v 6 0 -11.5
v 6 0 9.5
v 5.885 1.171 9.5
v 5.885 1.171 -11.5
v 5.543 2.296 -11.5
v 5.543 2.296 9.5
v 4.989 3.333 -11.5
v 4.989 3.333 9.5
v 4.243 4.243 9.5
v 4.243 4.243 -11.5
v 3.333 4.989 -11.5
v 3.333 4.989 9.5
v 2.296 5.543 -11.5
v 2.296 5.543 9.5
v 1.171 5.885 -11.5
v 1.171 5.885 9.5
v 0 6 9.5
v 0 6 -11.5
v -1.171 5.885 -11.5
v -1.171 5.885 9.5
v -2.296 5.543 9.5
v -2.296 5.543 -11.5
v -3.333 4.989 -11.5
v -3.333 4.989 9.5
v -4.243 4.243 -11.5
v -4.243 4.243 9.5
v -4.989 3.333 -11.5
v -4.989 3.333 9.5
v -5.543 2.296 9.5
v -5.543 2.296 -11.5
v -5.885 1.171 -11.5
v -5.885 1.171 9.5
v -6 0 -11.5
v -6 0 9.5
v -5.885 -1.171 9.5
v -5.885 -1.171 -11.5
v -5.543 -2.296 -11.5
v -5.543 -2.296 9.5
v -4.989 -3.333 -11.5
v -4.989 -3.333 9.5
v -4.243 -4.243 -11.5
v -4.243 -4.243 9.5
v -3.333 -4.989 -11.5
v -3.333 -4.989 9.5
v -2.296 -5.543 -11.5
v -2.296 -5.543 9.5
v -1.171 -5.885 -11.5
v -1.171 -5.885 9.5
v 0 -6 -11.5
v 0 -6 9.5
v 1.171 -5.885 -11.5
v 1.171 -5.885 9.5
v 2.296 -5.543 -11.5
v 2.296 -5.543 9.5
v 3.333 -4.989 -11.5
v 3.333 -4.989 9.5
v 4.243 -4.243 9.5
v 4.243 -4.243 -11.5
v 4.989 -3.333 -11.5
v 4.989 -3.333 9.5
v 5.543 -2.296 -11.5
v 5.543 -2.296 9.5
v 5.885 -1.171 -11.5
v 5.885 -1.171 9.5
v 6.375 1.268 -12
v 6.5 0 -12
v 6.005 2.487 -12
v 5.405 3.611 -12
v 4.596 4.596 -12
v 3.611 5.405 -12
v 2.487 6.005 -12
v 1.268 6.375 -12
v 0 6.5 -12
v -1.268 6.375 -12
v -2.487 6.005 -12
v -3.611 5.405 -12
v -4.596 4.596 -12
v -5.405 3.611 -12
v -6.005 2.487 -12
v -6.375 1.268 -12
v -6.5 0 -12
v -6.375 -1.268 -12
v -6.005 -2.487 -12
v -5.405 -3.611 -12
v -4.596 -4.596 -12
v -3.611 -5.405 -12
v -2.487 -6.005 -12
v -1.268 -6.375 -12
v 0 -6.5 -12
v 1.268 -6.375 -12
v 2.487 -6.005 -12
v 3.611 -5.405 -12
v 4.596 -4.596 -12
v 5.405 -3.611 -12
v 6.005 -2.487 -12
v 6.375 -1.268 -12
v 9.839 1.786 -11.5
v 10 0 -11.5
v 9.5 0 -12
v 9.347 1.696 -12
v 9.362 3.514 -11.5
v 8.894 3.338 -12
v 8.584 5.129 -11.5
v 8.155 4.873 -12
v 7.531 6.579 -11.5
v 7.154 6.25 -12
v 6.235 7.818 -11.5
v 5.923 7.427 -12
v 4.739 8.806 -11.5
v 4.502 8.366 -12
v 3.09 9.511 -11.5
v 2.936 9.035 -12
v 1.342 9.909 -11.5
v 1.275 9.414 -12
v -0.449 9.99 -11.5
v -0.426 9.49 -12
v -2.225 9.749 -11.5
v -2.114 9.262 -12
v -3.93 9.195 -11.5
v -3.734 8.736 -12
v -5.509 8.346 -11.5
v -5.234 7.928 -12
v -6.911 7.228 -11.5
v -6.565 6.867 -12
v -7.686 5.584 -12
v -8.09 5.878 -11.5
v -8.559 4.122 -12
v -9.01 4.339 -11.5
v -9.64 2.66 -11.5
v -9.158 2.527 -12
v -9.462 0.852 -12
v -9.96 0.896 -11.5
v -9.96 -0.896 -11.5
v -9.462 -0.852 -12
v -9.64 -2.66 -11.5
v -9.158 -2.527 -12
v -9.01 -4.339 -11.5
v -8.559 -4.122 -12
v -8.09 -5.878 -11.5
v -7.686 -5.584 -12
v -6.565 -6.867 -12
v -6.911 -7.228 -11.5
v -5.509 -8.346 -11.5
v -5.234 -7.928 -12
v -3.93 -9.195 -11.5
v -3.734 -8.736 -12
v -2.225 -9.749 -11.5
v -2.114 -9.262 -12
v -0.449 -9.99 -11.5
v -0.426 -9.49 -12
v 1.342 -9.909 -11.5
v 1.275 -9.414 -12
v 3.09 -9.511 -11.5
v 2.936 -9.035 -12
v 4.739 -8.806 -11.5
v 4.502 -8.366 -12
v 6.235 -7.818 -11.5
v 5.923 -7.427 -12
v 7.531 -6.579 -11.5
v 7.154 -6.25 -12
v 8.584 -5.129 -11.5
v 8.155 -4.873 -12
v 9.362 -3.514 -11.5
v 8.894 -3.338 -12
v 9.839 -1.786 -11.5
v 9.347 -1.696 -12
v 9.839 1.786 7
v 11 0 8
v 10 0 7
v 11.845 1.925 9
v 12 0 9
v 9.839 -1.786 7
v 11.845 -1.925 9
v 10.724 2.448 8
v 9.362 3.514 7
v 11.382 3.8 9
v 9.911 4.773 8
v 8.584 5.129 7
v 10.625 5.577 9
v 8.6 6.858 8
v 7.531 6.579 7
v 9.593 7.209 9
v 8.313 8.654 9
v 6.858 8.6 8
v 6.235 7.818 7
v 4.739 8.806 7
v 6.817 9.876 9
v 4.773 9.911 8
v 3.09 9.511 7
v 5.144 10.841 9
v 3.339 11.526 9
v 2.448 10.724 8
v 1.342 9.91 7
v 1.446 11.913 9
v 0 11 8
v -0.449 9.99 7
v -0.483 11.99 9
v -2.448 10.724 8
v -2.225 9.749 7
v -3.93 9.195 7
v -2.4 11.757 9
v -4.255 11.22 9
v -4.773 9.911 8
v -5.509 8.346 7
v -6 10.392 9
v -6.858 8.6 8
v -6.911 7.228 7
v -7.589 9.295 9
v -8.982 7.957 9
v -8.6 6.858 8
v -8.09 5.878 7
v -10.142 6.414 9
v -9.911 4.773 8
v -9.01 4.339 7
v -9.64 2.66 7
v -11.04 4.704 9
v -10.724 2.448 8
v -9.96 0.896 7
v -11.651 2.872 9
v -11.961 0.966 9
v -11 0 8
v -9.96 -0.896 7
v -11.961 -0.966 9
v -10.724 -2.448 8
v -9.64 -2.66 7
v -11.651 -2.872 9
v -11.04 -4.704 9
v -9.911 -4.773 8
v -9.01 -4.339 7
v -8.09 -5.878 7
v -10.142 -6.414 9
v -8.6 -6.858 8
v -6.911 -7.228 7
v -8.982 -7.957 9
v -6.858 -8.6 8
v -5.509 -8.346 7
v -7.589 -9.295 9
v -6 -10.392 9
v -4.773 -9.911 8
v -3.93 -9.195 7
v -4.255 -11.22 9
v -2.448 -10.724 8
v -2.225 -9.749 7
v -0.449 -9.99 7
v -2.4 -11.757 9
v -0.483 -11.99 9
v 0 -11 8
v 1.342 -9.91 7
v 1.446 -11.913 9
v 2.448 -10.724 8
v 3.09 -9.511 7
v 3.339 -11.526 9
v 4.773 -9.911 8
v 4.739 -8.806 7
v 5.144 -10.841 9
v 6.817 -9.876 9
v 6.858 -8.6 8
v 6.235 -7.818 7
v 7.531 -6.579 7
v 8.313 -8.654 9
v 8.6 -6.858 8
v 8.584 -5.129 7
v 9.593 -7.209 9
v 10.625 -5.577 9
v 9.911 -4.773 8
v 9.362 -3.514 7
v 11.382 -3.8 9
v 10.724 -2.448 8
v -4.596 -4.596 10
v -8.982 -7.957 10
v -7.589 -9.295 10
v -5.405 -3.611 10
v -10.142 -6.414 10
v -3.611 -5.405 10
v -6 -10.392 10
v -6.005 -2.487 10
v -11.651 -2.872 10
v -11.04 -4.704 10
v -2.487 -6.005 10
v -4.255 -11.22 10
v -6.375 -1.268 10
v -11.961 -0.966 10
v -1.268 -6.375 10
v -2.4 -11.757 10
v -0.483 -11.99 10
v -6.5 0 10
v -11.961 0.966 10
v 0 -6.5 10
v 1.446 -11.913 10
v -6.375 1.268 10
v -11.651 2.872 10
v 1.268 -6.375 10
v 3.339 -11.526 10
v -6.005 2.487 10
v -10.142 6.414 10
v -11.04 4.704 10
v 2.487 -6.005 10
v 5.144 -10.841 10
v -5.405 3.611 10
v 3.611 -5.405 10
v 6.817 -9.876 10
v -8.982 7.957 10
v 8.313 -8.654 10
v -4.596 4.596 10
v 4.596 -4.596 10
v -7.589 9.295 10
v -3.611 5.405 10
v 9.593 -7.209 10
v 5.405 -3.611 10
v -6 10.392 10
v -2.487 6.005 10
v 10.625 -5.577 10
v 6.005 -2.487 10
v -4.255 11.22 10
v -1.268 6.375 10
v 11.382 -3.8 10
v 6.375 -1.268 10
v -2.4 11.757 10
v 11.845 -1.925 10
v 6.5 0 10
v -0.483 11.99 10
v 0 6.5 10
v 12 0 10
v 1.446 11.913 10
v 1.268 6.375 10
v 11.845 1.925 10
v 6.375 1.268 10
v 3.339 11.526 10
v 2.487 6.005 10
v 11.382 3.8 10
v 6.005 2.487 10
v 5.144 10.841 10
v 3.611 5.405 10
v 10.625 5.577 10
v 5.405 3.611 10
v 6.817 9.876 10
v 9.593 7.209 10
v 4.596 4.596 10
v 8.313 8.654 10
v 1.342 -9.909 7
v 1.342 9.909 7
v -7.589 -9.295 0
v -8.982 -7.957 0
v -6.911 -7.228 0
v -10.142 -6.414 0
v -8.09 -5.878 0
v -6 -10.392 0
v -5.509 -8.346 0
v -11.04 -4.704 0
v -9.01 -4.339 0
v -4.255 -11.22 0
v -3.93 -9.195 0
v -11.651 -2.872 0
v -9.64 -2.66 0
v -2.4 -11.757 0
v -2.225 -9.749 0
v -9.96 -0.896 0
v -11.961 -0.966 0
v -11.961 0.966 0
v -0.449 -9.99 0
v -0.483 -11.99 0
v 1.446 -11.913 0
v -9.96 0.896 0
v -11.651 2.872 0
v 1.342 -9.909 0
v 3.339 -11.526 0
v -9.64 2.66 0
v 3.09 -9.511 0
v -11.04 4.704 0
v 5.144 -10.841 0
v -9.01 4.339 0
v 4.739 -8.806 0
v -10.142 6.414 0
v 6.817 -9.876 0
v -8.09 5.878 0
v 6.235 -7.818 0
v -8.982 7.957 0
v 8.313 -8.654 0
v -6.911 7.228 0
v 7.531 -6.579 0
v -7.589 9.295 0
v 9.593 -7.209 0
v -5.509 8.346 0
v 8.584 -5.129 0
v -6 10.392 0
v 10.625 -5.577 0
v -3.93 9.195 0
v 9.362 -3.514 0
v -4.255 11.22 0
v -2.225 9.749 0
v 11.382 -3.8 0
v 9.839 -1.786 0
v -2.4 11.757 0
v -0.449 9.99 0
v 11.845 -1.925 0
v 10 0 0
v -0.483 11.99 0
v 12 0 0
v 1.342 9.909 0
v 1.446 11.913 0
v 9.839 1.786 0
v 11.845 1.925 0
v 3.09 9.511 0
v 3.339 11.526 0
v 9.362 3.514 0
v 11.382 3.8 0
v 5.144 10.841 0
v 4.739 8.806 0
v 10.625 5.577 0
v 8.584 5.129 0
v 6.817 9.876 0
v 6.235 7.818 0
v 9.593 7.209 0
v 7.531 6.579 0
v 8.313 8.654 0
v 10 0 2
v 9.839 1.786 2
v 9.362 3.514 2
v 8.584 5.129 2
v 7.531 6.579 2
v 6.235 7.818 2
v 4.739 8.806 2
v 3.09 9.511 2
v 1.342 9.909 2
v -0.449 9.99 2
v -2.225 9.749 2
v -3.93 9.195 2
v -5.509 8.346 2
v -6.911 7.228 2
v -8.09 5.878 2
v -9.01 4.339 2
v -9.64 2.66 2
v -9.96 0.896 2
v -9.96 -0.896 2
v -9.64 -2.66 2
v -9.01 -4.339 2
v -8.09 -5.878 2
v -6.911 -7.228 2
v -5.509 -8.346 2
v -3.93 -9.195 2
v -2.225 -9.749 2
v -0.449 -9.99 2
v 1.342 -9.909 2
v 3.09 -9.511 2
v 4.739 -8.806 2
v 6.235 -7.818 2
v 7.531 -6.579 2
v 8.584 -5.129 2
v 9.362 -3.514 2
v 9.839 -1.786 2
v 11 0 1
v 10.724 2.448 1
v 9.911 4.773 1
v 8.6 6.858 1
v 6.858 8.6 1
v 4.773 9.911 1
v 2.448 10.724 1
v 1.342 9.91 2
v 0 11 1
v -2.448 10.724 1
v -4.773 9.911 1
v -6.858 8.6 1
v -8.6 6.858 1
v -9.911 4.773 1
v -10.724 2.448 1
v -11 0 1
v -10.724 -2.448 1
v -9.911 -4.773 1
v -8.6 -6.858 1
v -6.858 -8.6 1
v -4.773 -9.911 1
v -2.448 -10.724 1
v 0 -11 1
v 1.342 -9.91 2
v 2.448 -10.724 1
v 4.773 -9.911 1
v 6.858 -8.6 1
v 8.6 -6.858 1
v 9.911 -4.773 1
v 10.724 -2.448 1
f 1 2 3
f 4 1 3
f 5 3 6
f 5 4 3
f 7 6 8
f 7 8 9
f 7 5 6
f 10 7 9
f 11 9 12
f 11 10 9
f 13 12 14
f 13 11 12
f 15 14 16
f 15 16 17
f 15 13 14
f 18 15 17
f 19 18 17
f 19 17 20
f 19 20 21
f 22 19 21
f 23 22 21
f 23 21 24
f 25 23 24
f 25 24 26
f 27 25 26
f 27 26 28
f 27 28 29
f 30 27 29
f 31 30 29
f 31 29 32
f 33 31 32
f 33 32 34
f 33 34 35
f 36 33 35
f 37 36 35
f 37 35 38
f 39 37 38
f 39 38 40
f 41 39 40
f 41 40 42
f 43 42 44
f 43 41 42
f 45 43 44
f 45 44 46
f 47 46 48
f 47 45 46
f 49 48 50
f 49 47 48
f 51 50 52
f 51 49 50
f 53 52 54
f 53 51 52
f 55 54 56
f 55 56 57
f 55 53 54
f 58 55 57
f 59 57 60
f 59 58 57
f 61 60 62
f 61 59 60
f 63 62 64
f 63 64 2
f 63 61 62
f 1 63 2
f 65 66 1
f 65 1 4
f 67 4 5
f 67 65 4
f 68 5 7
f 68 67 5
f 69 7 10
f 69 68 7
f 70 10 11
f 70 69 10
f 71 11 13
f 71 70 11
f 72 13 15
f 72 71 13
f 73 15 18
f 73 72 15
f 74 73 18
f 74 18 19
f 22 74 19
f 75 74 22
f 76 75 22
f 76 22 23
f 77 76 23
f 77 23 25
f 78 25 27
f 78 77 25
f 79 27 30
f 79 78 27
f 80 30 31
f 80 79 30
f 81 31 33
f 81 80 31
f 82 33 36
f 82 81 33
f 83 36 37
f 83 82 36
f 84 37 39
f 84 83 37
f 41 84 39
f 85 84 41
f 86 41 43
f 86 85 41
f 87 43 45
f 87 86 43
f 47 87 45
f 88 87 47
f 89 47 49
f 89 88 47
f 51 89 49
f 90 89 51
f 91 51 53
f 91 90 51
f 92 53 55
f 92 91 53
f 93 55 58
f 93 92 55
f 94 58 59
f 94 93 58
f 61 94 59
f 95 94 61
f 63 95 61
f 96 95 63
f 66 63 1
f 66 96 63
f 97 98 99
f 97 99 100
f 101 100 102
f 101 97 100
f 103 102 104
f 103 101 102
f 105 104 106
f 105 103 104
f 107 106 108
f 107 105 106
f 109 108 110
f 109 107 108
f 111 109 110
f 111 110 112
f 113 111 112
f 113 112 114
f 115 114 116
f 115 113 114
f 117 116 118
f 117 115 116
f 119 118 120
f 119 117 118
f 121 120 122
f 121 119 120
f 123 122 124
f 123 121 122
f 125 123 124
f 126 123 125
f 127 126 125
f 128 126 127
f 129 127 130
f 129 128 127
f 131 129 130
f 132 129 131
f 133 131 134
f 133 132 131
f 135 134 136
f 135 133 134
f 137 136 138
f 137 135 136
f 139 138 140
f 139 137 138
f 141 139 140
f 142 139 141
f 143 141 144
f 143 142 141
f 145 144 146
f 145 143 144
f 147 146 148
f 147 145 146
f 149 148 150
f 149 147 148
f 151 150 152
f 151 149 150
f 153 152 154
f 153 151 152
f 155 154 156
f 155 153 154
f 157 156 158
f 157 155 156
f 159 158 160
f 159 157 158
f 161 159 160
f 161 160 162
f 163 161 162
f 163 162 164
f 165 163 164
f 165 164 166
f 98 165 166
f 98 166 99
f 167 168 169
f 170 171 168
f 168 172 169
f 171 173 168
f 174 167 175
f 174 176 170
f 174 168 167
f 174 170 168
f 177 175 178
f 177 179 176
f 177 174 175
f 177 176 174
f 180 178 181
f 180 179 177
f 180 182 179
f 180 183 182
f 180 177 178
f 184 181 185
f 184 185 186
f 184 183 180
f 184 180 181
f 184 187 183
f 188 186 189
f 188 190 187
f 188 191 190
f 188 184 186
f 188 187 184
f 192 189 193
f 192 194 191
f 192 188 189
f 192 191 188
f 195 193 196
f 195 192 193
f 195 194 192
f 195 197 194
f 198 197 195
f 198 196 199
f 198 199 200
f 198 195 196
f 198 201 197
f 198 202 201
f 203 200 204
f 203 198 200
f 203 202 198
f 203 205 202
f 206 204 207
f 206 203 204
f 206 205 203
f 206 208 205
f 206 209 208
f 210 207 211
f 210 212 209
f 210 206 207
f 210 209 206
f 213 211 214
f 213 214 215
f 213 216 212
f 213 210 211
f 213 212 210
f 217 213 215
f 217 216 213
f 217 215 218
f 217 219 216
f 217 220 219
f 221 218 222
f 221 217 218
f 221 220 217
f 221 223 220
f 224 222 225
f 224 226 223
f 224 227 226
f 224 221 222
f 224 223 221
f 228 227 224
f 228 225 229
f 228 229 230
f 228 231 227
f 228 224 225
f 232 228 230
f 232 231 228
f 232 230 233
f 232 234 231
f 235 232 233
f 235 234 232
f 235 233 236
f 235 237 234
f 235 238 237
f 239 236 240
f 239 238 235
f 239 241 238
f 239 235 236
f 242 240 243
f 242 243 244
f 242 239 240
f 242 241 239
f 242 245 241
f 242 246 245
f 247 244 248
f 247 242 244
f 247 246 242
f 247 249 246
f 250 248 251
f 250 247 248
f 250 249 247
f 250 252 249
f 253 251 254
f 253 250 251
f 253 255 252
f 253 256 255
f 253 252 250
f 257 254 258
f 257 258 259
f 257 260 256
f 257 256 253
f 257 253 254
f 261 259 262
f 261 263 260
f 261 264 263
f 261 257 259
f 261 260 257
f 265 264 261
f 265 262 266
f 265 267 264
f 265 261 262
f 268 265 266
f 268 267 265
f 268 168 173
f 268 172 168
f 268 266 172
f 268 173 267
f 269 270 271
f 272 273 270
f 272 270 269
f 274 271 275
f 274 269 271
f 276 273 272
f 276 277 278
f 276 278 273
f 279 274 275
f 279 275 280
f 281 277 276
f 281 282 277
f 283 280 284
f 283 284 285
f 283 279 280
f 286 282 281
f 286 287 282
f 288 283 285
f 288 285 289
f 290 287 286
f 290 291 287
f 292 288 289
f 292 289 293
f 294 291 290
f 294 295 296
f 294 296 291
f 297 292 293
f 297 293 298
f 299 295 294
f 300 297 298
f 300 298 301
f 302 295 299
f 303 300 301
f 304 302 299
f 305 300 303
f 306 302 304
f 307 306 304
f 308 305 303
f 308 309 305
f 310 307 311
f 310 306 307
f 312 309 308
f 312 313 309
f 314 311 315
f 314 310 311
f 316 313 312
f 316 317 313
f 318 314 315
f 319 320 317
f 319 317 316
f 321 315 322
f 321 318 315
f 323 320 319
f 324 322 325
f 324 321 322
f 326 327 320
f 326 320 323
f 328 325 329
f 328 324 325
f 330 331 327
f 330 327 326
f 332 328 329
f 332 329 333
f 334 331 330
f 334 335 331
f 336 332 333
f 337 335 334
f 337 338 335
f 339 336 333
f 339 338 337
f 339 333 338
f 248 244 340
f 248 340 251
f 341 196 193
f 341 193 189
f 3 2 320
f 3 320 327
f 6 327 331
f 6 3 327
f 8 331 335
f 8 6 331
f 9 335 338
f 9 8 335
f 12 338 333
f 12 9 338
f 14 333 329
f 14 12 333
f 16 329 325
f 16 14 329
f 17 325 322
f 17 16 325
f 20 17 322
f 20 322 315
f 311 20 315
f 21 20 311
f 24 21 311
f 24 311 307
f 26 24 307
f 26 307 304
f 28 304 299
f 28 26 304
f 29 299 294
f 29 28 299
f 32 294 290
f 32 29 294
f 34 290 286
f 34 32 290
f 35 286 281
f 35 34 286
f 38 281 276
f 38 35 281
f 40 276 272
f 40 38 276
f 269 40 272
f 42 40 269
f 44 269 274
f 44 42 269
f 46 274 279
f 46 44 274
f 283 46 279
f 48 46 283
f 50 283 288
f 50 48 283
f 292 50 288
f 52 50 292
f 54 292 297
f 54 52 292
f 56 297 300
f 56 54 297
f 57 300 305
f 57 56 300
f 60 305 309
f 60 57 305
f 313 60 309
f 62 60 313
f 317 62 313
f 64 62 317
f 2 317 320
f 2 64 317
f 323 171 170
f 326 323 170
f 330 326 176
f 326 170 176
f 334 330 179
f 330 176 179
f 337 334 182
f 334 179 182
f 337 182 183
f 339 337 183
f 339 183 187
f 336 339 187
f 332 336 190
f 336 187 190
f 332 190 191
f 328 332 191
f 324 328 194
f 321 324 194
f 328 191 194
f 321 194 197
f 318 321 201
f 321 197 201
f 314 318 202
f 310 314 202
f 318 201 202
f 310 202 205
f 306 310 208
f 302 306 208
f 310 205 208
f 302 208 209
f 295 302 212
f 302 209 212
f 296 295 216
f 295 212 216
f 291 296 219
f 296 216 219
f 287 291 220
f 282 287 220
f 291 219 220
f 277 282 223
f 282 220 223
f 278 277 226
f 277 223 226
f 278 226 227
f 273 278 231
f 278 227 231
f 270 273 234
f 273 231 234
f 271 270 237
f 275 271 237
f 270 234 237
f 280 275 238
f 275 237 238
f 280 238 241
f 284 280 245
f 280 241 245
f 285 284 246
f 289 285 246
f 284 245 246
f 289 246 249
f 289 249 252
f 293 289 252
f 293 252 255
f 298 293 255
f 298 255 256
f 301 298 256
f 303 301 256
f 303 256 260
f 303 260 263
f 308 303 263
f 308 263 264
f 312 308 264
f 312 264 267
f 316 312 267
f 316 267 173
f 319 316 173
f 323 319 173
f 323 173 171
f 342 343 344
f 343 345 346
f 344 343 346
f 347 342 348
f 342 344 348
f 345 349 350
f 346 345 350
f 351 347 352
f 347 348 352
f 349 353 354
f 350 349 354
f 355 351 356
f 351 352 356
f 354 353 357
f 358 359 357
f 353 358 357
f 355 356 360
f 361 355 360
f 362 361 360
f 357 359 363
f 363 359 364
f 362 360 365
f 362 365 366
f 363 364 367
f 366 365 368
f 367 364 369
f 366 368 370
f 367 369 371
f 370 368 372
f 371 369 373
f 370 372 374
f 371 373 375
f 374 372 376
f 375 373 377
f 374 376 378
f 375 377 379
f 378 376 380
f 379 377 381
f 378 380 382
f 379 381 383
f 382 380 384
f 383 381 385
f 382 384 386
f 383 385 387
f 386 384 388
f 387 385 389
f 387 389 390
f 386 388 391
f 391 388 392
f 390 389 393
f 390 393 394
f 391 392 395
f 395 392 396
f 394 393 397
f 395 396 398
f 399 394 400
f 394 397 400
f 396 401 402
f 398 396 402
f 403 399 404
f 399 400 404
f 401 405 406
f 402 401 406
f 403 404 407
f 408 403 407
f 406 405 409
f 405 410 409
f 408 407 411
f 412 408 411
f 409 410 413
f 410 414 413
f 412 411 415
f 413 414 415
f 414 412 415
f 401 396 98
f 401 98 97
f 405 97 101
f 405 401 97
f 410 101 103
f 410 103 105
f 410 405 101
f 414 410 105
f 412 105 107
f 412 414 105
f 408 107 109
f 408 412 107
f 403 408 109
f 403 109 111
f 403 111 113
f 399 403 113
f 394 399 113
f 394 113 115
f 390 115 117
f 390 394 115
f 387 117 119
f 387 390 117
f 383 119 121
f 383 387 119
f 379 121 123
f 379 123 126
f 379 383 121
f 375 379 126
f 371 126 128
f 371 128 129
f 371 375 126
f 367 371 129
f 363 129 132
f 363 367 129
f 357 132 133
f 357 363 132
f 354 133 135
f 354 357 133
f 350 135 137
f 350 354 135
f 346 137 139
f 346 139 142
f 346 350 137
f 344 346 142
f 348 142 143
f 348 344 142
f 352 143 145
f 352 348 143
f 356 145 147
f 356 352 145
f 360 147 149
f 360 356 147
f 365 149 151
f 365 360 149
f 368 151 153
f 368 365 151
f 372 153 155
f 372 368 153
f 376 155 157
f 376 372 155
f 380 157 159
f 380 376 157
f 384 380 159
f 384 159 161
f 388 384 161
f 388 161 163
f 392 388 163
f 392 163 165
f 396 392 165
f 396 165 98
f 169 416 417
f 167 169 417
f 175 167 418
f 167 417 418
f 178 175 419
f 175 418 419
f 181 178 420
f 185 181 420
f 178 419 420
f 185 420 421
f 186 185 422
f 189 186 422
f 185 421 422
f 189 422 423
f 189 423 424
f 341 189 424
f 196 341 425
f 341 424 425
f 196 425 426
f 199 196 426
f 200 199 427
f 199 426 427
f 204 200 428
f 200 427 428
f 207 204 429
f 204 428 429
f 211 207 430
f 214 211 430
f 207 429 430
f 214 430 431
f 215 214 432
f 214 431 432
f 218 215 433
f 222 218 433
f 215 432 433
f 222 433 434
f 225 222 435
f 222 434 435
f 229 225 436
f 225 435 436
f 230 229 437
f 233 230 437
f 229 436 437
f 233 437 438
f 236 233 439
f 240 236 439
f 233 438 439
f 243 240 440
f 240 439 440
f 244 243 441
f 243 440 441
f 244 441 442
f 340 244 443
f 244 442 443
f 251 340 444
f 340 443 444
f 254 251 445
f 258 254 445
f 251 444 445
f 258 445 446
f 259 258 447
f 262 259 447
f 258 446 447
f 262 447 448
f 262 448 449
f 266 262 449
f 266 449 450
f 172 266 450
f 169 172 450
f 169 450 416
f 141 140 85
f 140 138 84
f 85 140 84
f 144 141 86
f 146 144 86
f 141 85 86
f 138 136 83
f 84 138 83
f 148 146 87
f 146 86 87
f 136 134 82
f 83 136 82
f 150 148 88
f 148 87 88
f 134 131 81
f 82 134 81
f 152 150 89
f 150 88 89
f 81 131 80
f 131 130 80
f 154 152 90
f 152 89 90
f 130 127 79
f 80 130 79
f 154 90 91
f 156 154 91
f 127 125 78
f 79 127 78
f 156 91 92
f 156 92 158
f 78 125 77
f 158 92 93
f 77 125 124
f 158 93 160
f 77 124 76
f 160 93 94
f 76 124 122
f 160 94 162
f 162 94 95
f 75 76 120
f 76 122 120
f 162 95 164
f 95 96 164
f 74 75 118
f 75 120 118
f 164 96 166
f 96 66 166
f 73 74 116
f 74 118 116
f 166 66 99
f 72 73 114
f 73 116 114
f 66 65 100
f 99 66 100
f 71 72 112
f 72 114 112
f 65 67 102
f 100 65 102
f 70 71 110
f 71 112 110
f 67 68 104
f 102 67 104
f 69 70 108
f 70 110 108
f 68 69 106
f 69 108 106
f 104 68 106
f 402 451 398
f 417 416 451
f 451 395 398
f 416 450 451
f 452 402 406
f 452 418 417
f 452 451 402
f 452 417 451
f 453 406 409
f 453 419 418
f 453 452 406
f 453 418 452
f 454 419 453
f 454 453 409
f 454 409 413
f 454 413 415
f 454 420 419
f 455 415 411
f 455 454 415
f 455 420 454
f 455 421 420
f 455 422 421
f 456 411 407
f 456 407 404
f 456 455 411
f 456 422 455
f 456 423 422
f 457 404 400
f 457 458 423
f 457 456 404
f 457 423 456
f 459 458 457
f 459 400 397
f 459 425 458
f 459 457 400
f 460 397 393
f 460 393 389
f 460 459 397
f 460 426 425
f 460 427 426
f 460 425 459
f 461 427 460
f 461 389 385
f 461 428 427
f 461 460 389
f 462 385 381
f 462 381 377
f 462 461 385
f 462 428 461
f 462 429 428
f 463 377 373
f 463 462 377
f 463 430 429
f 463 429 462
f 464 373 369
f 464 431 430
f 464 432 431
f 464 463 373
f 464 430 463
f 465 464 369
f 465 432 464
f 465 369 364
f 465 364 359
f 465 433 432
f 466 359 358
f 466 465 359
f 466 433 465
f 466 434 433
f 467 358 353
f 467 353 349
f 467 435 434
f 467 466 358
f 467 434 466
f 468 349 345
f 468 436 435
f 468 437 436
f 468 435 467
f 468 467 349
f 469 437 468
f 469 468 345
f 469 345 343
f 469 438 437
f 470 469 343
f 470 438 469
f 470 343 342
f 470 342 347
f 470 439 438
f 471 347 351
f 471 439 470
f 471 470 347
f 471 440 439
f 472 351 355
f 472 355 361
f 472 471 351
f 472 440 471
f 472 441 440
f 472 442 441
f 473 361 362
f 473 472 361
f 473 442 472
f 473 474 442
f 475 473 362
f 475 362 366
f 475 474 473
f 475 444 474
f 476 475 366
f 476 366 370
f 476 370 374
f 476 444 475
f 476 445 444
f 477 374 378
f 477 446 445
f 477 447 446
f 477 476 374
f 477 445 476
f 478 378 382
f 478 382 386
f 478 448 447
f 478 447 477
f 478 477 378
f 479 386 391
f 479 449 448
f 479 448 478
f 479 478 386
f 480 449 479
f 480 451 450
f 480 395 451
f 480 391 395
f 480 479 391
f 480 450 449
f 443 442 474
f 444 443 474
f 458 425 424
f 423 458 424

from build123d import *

# Parameters (mm, degrees)
F0_R     = 10
F0_R_2   = 6
F1_DEPTH = 12
F2_R     = 12
F2_R_2   = 6
F3_DEPTH = 2
F4_R     = 10
F4_R_2   = 6
F5_DEPTH = 5
F6_R     = 12
F6_R_2   = 6
F7_DEPTH = 3
F8_SIZE  = 1.99999
F9_SIZE  = 1.99999
F10_SIZE = 0.5


# Not quite as in the source:
# - a fillet or chamfer is up to 0.001 mm smaller than in the source, because OpenCascade refuses the exact size


with BuildPart() as f1:
    # F0 (on Top) → F1 (new body)
    with BuildSketch(Plane.XY):
        Circle(F0_R)
        Circle(F0_R_2, mode=Mode.SUBTRACT)
    extrude(amount=-F1_DEPTH)

    # F2 (on face) → F3 (join)
    with BuildSketch(Plane.XY):
        Circle(F2_R)
        Circle(F2_R_2, mode=Mode.SUBTRACT)
    extrude(amount=F3_DEPTH)

    # F4 (on face) → F5 (join)
    with BuildSketch(Plane.XY.offset(2)):
        Circle(F4_R)
        Circle(F4_R_2, mode=Mode.SUBTRACT)
    extrude(amount=F5_DEPTH)

    # F6 (on face) → F7 (join)
    with BuildSketch(Plane.XY.offset(7)):
        Circle(F6_R)
        Circle(F6_R_2, mode=Mode.SUBTRACT)
    extrude(amount=F7_DEPTH)

    # F8 (size 2 in the source; OpenCascade refuses exactly that, so slightly less here)
    f8_edges = [f1.edges().sort_by_distance(p)[0] for p in [
        (-12, 0, 2),
    ]]
    chamfer(f8_edges, length=F8_SIZE)

    # F9 (size 2 in the source; OpenCascade refuses exactly that, so slightly less here)
    f9_edges = [f1.edges().sort_by_distance(p)[0] for p in [
        (-12, 0, 7),
    ]]
    chamfer(f9_edges, length=F9_SIZE)

    # F10
    f10_edges = [f1.edges().sort_by_distance(p)[0] for p in [
        (-10, 0, -12),
        (-6, 0, -12),
        (-6, 0, 10),
    ]]
    chamfer(f10_edges, length=F10_SIZE)


solid = f1.part
